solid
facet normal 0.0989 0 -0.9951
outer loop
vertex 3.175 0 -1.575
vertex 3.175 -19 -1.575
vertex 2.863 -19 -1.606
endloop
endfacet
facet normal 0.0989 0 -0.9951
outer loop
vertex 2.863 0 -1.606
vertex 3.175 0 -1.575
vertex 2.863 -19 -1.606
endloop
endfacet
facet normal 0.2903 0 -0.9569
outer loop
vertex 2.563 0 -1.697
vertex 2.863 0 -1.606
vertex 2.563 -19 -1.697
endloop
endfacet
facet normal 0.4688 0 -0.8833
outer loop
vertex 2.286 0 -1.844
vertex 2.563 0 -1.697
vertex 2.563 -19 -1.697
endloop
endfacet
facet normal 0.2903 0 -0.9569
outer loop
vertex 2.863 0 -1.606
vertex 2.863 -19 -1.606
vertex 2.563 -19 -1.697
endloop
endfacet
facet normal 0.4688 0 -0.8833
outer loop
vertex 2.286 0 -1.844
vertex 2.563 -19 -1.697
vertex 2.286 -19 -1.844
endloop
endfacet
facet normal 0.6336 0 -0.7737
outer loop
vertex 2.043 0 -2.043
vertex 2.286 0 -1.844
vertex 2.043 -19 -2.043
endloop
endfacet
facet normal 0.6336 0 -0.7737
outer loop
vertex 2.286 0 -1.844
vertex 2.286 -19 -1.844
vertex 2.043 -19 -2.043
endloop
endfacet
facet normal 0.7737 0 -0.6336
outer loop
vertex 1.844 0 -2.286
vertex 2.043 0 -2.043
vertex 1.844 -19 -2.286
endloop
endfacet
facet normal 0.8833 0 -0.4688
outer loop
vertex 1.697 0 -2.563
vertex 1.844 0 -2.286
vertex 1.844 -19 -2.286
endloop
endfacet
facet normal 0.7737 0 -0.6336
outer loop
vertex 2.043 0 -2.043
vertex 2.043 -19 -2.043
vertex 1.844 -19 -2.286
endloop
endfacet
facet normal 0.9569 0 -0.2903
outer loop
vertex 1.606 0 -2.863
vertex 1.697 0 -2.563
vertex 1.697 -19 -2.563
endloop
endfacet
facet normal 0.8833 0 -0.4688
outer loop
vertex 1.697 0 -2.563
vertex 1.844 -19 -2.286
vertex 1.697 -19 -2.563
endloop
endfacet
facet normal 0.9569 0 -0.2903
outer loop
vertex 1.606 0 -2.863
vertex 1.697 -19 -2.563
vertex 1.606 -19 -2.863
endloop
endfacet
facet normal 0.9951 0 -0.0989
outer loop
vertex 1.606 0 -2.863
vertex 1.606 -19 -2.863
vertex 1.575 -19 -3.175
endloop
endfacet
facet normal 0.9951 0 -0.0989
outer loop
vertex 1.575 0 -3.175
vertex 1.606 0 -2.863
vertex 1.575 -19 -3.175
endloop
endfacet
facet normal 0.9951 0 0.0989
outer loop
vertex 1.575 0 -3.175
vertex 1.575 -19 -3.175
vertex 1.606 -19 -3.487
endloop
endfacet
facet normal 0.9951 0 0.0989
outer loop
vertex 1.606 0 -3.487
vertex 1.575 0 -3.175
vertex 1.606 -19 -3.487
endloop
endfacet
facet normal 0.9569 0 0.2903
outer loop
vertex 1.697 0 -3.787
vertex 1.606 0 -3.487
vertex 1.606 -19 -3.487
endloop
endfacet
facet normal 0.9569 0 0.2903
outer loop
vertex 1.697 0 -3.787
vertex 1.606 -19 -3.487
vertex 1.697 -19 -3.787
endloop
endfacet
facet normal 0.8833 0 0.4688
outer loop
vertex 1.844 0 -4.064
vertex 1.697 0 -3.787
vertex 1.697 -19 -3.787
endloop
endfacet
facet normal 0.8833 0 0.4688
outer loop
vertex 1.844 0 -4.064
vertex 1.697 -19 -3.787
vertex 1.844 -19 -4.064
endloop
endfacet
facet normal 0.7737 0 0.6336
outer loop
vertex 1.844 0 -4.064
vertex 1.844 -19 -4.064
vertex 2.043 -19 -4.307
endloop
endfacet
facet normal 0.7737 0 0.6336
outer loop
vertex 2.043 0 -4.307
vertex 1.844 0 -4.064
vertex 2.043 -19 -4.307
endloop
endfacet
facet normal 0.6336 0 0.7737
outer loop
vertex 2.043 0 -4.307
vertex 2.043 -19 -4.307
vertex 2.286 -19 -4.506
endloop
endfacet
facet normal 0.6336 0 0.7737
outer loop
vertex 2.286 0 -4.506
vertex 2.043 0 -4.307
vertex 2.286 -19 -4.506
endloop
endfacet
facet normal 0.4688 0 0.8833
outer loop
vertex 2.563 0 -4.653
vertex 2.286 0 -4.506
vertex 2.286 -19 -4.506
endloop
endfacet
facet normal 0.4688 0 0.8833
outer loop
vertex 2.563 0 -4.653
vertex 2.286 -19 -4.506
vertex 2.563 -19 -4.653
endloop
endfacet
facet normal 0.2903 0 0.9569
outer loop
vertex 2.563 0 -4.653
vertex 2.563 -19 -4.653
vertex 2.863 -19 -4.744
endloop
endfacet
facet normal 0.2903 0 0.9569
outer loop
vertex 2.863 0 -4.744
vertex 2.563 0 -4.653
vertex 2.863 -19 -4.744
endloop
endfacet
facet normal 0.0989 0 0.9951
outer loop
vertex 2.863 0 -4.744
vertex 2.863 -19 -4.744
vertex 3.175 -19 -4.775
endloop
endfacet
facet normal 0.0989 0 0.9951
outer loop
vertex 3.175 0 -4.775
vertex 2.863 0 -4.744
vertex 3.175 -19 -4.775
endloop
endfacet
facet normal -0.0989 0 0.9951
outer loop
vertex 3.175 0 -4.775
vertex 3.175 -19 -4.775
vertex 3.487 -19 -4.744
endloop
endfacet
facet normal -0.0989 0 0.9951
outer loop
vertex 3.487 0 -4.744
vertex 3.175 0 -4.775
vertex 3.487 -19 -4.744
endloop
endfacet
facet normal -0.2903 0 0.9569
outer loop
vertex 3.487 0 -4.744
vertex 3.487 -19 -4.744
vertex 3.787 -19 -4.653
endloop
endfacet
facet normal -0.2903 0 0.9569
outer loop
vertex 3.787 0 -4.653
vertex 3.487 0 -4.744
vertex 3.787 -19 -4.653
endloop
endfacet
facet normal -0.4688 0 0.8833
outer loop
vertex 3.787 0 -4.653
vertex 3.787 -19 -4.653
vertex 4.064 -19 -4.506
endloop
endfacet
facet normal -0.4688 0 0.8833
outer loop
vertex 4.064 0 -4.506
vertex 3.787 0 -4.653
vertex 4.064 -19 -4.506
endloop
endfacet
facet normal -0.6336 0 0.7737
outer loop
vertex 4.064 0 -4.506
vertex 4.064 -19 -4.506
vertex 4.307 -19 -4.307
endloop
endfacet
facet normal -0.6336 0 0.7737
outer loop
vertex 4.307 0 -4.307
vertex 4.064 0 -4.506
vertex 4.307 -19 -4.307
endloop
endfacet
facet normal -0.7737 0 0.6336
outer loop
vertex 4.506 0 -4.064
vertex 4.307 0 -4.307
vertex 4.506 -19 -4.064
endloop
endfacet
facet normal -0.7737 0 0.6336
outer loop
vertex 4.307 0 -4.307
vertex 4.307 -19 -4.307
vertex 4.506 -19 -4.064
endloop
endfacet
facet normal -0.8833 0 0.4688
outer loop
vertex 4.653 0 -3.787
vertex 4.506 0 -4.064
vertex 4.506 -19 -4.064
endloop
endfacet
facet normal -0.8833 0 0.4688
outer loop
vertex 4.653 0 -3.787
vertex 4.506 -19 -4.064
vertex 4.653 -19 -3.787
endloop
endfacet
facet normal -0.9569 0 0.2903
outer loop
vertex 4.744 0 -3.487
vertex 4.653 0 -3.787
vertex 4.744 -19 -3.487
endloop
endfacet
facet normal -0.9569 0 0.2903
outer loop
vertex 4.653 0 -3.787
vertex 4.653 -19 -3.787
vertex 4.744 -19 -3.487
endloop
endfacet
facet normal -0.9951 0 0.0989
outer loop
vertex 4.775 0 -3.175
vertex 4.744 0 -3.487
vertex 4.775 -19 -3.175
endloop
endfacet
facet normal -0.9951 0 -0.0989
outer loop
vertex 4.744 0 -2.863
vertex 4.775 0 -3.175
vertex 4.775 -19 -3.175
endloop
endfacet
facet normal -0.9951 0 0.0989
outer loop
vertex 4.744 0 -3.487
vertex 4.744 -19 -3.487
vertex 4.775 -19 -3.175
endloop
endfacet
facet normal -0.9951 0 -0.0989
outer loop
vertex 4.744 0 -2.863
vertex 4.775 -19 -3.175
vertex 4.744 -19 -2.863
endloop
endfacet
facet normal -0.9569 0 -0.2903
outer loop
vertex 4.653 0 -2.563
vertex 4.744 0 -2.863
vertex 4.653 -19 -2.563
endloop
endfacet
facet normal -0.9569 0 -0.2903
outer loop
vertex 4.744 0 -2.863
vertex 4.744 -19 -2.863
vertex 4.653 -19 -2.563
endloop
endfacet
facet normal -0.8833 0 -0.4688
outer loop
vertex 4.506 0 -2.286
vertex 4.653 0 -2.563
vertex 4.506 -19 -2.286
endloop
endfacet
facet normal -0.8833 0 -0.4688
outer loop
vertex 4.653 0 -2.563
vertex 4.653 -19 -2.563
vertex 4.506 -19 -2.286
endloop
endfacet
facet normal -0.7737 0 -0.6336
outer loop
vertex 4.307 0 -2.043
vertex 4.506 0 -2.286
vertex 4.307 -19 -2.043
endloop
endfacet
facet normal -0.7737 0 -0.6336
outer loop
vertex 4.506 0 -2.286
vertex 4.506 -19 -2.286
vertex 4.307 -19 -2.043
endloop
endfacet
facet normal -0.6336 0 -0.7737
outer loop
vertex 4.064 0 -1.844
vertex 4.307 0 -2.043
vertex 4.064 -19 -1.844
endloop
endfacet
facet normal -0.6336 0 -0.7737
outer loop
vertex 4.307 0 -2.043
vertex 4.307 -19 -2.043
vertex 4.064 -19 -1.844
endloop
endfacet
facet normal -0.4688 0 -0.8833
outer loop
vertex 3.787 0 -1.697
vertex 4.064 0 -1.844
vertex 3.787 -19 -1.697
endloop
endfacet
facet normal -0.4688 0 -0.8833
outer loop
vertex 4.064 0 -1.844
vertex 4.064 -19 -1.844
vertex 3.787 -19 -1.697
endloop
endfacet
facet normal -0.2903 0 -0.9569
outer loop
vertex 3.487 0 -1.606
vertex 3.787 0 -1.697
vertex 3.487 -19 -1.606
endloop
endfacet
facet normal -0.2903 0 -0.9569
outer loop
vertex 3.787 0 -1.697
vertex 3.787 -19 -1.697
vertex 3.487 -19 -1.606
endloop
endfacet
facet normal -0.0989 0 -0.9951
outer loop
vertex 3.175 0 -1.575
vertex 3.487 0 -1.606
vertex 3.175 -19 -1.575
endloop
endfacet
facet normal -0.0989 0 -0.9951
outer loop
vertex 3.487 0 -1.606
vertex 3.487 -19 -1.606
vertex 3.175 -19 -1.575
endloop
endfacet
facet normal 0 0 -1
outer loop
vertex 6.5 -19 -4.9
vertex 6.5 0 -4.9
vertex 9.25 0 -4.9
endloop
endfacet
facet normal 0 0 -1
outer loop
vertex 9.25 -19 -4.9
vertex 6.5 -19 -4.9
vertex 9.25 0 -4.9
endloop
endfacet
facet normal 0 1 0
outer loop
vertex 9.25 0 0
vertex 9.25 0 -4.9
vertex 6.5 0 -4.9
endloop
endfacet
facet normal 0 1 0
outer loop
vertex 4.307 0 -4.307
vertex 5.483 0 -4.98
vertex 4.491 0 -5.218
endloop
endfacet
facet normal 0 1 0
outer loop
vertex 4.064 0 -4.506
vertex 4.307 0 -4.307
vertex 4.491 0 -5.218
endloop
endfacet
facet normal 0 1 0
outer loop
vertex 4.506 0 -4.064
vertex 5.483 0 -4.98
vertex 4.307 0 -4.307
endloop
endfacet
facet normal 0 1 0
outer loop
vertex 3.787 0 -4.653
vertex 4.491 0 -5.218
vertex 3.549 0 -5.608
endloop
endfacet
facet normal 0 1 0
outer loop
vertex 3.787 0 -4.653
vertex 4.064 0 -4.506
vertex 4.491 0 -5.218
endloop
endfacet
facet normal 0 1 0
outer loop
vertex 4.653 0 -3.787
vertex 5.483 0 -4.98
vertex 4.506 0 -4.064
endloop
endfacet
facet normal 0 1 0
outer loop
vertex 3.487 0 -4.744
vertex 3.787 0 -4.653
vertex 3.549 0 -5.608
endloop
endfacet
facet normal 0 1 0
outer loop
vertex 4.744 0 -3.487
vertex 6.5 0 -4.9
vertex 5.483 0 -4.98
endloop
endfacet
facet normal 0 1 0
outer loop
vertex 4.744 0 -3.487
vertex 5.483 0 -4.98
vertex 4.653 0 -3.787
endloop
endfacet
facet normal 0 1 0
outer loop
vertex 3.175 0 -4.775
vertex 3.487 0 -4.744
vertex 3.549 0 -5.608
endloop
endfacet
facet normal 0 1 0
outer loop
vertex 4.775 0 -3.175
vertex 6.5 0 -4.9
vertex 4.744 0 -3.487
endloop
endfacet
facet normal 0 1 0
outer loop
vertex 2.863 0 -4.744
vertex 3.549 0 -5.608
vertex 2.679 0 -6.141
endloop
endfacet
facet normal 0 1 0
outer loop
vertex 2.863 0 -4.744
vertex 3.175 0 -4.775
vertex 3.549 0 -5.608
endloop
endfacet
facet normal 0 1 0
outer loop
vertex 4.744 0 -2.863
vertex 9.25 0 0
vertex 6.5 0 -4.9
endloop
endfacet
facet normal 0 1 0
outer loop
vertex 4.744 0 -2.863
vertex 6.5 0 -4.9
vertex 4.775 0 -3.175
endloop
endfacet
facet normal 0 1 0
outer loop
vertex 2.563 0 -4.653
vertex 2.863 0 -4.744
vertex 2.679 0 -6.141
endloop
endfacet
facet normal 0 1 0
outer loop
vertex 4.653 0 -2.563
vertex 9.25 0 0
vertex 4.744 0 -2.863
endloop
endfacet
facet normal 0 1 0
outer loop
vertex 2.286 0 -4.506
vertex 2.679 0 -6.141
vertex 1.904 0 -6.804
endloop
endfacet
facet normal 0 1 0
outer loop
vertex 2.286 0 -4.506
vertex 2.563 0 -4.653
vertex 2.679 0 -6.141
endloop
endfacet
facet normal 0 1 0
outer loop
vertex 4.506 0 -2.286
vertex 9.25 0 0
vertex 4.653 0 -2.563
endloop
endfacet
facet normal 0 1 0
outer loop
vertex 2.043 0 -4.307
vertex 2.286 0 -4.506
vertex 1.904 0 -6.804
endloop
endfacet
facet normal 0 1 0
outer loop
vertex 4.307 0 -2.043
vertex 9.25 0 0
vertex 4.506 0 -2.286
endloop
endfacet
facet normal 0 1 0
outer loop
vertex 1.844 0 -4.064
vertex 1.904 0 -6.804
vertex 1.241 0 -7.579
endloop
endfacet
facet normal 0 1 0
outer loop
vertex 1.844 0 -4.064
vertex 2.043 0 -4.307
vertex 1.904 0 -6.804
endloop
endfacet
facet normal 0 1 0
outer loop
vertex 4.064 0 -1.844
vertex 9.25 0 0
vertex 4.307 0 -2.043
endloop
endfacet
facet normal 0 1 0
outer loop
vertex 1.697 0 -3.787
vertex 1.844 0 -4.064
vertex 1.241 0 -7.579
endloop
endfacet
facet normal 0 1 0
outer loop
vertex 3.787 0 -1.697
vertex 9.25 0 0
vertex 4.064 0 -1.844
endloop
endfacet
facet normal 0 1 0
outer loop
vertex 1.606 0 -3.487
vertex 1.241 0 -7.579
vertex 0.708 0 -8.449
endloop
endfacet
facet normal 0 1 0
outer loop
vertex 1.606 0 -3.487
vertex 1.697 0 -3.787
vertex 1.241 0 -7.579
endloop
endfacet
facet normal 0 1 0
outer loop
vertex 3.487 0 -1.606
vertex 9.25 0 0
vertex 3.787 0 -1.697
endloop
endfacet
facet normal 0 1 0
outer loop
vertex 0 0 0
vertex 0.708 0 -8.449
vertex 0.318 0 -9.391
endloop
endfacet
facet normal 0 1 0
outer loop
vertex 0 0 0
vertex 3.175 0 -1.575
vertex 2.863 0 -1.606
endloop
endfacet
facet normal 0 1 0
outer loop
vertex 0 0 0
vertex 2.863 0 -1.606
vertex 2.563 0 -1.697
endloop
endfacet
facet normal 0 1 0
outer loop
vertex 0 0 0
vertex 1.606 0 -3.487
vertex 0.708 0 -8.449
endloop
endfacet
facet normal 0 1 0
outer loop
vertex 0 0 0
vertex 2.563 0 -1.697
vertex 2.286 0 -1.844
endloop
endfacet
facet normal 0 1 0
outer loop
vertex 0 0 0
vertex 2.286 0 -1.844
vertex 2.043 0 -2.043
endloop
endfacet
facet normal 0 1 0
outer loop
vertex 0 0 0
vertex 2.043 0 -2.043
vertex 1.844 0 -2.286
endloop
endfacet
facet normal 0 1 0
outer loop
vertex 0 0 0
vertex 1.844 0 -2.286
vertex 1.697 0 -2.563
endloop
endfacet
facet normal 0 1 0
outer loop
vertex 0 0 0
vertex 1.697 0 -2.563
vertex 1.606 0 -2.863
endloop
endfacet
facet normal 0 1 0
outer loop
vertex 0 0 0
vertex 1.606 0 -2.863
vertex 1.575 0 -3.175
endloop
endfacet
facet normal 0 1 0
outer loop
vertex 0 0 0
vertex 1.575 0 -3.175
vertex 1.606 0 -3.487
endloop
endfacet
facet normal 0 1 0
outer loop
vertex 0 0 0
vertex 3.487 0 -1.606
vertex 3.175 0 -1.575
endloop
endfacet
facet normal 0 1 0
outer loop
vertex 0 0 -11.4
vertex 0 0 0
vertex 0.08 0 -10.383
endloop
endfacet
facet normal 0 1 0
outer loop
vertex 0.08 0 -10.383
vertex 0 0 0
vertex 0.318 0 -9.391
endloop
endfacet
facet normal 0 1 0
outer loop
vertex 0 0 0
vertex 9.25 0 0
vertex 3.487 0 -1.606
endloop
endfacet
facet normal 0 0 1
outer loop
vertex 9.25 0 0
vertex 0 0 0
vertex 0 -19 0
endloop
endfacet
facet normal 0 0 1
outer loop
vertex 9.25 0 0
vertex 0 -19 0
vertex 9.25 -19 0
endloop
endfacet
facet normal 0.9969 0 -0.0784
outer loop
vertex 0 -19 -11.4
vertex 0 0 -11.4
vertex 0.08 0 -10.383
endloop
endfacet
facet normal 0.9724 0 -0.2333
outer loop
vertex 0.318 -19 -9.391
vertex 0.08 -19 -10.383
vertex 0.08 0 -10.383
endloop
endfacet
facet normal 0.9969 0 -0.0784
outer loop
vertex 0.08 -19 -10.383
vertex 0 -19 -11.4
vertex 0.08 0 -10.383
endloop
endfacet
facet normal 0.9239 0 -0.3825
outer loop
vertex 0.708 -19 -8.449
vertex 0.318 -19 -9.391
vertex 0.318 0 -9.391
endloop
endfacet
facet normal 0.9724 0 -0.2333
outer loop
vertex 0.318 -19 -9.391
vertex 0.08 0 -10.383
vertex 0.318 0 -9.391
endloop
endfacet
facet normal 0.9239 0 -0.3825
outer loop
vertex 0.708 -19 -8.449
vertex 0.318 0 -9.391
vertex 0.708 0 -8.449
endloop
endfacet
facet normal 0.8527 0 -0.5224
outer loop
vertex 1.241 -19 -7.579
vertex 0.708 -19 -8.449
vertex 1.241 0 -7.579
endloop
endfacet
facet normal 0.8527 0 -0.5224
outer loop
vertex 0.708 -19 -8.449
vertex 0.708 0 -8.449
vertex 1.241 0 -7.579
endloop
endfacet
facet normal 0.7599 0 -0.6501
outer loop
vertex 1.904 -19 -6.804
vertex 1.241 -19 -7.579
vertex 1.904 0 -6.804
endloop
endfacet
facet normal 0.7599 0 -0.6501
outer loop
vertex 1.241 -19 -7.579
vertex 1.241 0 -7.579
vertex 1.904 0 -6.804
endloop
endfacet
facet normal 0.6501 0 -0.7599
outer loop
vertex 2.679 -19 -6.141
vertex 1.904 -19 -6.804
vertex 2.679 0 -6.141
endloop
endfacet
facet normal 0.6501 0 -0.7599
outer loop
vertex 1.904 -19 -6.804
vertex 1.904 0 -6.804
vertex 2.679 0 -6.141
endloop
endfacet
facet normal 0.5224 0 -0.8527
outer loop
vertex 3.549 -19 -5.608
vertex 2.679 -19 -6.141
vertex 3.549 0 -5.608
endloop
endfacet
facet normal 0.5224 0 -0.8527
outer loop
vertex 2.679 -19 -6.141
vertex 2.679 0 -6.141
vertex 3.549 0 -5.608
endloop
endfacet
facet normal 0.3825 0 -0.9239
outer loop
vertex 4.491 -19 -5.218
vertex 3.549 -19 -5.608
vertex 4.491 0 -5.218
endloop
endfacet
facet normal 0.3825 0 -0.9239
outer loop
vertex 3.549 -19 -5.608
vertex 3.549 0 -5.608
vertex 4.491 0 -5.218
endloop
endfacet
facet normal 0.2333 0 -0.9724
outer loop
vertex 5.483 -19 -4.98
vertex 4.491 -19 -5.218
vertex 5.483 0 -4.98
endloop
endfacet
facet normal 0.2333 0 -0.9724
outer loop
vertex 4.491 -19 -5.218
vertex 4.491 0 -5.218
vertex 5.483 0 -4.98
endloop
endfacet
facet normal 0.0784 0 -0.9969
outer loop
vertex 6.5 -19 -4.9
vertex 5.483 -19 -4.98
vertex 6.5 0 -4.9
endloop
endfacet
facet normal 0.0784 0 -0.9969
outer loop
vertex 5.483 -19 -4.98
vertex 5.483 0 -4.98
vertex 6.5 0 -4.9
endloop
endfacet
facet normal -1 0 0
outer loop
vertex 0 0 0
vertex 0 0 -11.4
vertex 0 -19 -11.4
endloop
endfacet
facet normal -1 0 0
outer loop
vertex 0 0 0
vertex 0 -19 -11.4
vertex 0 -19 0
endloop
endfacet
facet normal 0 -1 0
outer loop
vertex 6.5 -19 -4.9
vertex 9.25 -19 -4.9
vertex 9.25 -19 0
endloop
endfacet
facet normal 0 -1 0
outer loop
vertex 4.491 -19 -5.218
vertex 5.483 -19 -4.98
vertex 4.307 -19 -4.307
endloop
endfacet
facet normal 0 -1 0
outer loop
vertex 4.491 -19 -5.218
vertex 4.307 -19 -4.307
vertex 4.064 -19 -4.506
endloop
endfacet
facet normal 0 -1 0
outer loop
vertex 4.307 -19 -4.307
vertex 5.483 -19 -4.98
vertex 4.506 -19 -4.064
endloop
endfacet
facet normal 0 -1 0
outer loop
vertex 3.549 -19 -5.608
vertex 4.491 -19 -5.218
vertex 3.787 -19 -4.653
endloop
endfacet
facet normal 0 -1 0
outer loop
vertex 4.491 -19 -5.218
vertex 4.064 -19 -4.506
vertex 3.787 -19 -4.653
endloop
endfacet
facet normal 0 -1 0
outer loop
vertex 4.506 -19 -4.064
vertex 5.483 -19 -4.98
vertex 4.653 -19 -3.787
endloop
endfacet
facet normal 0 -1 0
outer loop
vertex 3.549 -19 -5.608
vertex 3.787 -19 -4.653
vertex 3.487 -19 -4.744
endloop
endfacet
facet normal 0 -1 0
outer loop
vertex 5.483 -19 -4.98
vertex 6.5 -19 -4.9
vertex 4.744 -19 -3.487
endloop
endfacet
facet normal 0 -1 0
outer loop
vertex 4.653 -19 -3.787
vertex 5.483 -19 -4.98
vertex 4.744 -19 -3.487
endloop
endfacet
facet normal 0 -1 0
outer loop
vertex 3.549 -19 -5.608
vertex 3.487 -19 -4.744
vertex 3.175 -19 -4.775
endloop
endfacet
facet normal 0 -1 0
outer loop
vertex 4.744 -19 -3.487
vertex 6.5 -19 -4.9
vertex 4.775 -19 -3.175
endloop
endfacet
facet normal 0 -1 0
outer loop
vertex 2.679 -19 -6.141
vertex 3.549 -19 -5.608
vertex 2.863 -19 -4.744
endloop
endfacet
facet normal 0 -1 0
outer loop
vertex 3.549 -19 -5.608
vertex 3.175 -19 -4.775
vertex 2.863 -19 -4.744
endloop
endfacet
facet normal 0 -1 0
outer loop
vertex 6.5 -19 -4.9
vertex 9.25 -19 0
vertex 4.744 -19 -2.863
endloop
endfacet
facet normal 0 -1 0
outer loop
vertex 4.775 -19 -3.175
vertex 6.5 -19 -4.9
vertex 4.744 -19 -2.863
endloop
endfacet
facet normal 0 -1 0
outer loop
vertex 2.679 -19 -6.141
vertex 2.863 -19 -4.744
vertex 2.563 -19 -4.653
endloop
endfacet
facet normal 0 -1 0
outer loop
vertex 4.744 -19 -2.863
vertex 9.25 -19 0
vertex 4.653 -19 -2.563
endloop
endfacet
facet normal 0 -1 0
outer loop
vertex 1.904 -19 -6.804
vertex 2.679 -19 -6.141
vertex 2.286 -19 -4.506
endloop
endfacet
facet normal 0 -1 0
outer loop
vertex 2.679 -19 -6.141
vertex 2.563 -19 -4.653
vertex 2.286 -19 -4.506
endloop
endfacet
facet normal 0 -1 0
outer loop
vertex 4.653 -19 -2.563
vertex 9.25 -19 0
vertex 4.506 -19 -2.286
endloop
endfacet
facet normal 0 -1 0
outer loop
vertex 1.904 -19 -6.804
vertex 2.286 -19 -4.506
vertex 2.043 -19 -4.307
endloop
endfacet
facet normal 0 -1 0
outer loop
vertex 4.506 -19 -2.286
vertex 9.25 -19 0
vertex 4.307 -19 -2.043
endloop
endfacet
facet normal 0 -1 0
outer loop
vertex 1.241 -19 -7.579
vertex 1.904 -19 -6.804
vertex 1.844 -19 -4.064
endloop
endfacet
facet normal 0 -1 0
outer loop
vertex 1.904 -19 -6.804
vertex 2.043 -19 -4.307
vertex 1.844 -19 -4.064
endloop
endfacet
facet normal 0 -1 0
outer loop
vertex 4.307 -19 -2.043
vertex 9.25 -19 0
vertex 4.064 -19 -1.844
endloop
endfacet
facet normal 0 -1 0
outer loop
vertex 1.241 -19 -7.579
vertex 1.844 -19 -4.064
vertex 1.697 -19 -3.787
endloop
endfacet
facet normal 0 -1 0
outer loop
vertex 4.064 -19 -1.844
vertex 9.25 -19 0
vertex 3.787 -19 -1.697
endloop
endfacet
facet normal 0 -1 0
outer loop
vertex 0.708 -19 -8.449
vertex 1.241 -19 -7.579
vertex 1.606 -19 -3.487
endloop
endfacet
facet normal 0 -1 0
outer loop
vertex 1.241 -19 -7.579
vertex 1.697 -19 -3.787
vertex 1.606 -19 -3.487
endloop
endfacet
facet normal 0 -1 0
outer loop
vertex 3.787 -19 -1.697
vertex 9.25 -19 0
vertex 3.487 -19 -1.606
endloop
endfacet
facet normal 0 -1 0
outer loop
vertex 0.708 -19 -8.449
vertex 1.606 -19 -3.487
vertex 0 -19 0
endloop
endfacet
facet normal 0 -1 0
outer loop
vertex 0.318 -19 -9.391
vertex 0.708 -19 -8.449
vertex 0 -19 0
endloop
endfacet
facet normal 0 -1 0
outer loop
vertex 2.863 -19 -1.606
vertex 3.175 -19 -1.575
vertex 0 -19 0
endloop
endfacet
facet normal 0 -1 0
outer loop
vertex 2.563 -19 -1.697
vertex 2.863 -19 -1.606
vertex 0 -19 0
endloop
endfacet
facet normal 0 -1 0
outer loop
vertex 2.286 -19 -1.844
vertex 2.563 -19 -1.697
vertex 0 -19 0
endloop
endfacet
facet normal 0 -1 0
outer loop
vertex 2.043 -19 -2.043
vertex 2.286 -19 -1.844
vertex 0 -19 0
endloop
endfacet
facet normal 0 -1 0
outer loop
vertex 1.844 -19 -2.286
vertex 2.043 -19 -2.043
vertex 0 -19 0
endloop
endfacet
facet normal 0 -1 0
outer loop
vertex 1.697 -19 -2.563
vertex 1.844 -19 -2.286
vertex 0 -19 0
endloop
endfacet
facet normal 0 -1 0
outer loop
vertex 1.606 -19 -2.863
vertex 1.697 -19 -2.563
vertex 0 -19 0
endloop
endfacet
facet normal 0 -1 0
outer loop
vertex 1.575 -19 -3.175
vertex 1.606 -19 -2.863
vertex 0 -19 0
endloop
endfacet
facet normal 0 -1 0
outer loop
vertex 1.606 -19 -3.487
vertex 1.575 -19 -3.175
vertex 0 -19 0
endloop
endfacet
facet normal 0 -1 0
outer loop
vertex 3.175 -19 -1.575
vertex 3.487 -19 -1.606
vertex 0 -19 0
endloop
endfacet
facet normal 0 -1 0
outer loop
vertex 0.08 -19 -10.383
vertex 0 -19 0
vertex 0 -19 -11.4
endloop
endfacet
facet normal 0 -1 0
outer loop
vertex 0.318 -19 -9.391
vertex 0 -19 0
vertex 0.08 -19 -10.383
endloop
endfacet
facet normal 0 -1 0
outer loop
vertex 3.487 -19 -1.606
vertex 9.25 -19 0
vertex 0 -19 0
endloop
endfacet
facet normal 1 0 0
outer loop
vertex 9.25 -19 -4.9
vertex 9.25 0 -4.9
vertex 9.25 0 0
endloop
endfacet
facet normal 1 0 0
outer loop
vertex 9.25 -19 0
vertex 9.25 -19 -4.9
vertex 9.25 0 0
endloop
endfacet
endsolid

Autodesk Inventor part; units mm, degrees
ref_plane "YZ Plane" through (0, 0, 0) normal (1, 0, 0) x (0, 1, 0)
ref_plane "XZ Plane" through (0, 0, 0) normal (0, 1, 0) x (-1, 0, 0)
ref_plane "XY Plane" through (0, 0, 0) normal (0, 0, 1) x (1, 0, 0)
sketch "Base" plane through (0, 0, 0) normal (0, 1, 0) x (-1, 0, 0)
  line L0 (0, 0) -> (-12, 0)
  line L1 (-12, 0) -> (-12, -11.4)
  line L2 (-12, -11.4) -> (0, -11.4) construction
  line L3 (0, -11.4) -> (0, 0)
  circle A0 centre (-3.175, -3.175) radius 3.175
  circle A1 centre (-6.5, -11.4) radius 6.5
  line L4 (-6.5, -4.9) -> (-6.5, 0)
  line L5 (-6.5, -4.9) -> (-12, -4.9)
  line L6 (-9.25, -4.9) -> (-9.25, 0)
  point P0 (0, 0)
  point P1 (-12, -7.9359)
  dimension "d24" = 13
  dimension "d21" = 12
  dimension "d22" = 11.4
  dimension "d23" = 6.35
  dimension "d26" = 5.5
  dimension "d36" = 5.5
extrude "Stock" add sketch "Base" against normal blind 19 contours L4 L5 L6 L0 | L0 A0 A1 L4 | L0 L3 A0 | A0 A1 | L3 A1 A0 picked at (-3.3154, -3.7047)
hole "3mm Hole" at (3.175, 0, -3.175) direction (0, -1, 0) diameter 3.2004 end through all clearance for "Socket Head Cap Screw" size "M3" standard "Ansi Metric M Profile"
equation "\"d36\" = d26"
properties part number "Joint Spacer" material "Aluminum 6061"
